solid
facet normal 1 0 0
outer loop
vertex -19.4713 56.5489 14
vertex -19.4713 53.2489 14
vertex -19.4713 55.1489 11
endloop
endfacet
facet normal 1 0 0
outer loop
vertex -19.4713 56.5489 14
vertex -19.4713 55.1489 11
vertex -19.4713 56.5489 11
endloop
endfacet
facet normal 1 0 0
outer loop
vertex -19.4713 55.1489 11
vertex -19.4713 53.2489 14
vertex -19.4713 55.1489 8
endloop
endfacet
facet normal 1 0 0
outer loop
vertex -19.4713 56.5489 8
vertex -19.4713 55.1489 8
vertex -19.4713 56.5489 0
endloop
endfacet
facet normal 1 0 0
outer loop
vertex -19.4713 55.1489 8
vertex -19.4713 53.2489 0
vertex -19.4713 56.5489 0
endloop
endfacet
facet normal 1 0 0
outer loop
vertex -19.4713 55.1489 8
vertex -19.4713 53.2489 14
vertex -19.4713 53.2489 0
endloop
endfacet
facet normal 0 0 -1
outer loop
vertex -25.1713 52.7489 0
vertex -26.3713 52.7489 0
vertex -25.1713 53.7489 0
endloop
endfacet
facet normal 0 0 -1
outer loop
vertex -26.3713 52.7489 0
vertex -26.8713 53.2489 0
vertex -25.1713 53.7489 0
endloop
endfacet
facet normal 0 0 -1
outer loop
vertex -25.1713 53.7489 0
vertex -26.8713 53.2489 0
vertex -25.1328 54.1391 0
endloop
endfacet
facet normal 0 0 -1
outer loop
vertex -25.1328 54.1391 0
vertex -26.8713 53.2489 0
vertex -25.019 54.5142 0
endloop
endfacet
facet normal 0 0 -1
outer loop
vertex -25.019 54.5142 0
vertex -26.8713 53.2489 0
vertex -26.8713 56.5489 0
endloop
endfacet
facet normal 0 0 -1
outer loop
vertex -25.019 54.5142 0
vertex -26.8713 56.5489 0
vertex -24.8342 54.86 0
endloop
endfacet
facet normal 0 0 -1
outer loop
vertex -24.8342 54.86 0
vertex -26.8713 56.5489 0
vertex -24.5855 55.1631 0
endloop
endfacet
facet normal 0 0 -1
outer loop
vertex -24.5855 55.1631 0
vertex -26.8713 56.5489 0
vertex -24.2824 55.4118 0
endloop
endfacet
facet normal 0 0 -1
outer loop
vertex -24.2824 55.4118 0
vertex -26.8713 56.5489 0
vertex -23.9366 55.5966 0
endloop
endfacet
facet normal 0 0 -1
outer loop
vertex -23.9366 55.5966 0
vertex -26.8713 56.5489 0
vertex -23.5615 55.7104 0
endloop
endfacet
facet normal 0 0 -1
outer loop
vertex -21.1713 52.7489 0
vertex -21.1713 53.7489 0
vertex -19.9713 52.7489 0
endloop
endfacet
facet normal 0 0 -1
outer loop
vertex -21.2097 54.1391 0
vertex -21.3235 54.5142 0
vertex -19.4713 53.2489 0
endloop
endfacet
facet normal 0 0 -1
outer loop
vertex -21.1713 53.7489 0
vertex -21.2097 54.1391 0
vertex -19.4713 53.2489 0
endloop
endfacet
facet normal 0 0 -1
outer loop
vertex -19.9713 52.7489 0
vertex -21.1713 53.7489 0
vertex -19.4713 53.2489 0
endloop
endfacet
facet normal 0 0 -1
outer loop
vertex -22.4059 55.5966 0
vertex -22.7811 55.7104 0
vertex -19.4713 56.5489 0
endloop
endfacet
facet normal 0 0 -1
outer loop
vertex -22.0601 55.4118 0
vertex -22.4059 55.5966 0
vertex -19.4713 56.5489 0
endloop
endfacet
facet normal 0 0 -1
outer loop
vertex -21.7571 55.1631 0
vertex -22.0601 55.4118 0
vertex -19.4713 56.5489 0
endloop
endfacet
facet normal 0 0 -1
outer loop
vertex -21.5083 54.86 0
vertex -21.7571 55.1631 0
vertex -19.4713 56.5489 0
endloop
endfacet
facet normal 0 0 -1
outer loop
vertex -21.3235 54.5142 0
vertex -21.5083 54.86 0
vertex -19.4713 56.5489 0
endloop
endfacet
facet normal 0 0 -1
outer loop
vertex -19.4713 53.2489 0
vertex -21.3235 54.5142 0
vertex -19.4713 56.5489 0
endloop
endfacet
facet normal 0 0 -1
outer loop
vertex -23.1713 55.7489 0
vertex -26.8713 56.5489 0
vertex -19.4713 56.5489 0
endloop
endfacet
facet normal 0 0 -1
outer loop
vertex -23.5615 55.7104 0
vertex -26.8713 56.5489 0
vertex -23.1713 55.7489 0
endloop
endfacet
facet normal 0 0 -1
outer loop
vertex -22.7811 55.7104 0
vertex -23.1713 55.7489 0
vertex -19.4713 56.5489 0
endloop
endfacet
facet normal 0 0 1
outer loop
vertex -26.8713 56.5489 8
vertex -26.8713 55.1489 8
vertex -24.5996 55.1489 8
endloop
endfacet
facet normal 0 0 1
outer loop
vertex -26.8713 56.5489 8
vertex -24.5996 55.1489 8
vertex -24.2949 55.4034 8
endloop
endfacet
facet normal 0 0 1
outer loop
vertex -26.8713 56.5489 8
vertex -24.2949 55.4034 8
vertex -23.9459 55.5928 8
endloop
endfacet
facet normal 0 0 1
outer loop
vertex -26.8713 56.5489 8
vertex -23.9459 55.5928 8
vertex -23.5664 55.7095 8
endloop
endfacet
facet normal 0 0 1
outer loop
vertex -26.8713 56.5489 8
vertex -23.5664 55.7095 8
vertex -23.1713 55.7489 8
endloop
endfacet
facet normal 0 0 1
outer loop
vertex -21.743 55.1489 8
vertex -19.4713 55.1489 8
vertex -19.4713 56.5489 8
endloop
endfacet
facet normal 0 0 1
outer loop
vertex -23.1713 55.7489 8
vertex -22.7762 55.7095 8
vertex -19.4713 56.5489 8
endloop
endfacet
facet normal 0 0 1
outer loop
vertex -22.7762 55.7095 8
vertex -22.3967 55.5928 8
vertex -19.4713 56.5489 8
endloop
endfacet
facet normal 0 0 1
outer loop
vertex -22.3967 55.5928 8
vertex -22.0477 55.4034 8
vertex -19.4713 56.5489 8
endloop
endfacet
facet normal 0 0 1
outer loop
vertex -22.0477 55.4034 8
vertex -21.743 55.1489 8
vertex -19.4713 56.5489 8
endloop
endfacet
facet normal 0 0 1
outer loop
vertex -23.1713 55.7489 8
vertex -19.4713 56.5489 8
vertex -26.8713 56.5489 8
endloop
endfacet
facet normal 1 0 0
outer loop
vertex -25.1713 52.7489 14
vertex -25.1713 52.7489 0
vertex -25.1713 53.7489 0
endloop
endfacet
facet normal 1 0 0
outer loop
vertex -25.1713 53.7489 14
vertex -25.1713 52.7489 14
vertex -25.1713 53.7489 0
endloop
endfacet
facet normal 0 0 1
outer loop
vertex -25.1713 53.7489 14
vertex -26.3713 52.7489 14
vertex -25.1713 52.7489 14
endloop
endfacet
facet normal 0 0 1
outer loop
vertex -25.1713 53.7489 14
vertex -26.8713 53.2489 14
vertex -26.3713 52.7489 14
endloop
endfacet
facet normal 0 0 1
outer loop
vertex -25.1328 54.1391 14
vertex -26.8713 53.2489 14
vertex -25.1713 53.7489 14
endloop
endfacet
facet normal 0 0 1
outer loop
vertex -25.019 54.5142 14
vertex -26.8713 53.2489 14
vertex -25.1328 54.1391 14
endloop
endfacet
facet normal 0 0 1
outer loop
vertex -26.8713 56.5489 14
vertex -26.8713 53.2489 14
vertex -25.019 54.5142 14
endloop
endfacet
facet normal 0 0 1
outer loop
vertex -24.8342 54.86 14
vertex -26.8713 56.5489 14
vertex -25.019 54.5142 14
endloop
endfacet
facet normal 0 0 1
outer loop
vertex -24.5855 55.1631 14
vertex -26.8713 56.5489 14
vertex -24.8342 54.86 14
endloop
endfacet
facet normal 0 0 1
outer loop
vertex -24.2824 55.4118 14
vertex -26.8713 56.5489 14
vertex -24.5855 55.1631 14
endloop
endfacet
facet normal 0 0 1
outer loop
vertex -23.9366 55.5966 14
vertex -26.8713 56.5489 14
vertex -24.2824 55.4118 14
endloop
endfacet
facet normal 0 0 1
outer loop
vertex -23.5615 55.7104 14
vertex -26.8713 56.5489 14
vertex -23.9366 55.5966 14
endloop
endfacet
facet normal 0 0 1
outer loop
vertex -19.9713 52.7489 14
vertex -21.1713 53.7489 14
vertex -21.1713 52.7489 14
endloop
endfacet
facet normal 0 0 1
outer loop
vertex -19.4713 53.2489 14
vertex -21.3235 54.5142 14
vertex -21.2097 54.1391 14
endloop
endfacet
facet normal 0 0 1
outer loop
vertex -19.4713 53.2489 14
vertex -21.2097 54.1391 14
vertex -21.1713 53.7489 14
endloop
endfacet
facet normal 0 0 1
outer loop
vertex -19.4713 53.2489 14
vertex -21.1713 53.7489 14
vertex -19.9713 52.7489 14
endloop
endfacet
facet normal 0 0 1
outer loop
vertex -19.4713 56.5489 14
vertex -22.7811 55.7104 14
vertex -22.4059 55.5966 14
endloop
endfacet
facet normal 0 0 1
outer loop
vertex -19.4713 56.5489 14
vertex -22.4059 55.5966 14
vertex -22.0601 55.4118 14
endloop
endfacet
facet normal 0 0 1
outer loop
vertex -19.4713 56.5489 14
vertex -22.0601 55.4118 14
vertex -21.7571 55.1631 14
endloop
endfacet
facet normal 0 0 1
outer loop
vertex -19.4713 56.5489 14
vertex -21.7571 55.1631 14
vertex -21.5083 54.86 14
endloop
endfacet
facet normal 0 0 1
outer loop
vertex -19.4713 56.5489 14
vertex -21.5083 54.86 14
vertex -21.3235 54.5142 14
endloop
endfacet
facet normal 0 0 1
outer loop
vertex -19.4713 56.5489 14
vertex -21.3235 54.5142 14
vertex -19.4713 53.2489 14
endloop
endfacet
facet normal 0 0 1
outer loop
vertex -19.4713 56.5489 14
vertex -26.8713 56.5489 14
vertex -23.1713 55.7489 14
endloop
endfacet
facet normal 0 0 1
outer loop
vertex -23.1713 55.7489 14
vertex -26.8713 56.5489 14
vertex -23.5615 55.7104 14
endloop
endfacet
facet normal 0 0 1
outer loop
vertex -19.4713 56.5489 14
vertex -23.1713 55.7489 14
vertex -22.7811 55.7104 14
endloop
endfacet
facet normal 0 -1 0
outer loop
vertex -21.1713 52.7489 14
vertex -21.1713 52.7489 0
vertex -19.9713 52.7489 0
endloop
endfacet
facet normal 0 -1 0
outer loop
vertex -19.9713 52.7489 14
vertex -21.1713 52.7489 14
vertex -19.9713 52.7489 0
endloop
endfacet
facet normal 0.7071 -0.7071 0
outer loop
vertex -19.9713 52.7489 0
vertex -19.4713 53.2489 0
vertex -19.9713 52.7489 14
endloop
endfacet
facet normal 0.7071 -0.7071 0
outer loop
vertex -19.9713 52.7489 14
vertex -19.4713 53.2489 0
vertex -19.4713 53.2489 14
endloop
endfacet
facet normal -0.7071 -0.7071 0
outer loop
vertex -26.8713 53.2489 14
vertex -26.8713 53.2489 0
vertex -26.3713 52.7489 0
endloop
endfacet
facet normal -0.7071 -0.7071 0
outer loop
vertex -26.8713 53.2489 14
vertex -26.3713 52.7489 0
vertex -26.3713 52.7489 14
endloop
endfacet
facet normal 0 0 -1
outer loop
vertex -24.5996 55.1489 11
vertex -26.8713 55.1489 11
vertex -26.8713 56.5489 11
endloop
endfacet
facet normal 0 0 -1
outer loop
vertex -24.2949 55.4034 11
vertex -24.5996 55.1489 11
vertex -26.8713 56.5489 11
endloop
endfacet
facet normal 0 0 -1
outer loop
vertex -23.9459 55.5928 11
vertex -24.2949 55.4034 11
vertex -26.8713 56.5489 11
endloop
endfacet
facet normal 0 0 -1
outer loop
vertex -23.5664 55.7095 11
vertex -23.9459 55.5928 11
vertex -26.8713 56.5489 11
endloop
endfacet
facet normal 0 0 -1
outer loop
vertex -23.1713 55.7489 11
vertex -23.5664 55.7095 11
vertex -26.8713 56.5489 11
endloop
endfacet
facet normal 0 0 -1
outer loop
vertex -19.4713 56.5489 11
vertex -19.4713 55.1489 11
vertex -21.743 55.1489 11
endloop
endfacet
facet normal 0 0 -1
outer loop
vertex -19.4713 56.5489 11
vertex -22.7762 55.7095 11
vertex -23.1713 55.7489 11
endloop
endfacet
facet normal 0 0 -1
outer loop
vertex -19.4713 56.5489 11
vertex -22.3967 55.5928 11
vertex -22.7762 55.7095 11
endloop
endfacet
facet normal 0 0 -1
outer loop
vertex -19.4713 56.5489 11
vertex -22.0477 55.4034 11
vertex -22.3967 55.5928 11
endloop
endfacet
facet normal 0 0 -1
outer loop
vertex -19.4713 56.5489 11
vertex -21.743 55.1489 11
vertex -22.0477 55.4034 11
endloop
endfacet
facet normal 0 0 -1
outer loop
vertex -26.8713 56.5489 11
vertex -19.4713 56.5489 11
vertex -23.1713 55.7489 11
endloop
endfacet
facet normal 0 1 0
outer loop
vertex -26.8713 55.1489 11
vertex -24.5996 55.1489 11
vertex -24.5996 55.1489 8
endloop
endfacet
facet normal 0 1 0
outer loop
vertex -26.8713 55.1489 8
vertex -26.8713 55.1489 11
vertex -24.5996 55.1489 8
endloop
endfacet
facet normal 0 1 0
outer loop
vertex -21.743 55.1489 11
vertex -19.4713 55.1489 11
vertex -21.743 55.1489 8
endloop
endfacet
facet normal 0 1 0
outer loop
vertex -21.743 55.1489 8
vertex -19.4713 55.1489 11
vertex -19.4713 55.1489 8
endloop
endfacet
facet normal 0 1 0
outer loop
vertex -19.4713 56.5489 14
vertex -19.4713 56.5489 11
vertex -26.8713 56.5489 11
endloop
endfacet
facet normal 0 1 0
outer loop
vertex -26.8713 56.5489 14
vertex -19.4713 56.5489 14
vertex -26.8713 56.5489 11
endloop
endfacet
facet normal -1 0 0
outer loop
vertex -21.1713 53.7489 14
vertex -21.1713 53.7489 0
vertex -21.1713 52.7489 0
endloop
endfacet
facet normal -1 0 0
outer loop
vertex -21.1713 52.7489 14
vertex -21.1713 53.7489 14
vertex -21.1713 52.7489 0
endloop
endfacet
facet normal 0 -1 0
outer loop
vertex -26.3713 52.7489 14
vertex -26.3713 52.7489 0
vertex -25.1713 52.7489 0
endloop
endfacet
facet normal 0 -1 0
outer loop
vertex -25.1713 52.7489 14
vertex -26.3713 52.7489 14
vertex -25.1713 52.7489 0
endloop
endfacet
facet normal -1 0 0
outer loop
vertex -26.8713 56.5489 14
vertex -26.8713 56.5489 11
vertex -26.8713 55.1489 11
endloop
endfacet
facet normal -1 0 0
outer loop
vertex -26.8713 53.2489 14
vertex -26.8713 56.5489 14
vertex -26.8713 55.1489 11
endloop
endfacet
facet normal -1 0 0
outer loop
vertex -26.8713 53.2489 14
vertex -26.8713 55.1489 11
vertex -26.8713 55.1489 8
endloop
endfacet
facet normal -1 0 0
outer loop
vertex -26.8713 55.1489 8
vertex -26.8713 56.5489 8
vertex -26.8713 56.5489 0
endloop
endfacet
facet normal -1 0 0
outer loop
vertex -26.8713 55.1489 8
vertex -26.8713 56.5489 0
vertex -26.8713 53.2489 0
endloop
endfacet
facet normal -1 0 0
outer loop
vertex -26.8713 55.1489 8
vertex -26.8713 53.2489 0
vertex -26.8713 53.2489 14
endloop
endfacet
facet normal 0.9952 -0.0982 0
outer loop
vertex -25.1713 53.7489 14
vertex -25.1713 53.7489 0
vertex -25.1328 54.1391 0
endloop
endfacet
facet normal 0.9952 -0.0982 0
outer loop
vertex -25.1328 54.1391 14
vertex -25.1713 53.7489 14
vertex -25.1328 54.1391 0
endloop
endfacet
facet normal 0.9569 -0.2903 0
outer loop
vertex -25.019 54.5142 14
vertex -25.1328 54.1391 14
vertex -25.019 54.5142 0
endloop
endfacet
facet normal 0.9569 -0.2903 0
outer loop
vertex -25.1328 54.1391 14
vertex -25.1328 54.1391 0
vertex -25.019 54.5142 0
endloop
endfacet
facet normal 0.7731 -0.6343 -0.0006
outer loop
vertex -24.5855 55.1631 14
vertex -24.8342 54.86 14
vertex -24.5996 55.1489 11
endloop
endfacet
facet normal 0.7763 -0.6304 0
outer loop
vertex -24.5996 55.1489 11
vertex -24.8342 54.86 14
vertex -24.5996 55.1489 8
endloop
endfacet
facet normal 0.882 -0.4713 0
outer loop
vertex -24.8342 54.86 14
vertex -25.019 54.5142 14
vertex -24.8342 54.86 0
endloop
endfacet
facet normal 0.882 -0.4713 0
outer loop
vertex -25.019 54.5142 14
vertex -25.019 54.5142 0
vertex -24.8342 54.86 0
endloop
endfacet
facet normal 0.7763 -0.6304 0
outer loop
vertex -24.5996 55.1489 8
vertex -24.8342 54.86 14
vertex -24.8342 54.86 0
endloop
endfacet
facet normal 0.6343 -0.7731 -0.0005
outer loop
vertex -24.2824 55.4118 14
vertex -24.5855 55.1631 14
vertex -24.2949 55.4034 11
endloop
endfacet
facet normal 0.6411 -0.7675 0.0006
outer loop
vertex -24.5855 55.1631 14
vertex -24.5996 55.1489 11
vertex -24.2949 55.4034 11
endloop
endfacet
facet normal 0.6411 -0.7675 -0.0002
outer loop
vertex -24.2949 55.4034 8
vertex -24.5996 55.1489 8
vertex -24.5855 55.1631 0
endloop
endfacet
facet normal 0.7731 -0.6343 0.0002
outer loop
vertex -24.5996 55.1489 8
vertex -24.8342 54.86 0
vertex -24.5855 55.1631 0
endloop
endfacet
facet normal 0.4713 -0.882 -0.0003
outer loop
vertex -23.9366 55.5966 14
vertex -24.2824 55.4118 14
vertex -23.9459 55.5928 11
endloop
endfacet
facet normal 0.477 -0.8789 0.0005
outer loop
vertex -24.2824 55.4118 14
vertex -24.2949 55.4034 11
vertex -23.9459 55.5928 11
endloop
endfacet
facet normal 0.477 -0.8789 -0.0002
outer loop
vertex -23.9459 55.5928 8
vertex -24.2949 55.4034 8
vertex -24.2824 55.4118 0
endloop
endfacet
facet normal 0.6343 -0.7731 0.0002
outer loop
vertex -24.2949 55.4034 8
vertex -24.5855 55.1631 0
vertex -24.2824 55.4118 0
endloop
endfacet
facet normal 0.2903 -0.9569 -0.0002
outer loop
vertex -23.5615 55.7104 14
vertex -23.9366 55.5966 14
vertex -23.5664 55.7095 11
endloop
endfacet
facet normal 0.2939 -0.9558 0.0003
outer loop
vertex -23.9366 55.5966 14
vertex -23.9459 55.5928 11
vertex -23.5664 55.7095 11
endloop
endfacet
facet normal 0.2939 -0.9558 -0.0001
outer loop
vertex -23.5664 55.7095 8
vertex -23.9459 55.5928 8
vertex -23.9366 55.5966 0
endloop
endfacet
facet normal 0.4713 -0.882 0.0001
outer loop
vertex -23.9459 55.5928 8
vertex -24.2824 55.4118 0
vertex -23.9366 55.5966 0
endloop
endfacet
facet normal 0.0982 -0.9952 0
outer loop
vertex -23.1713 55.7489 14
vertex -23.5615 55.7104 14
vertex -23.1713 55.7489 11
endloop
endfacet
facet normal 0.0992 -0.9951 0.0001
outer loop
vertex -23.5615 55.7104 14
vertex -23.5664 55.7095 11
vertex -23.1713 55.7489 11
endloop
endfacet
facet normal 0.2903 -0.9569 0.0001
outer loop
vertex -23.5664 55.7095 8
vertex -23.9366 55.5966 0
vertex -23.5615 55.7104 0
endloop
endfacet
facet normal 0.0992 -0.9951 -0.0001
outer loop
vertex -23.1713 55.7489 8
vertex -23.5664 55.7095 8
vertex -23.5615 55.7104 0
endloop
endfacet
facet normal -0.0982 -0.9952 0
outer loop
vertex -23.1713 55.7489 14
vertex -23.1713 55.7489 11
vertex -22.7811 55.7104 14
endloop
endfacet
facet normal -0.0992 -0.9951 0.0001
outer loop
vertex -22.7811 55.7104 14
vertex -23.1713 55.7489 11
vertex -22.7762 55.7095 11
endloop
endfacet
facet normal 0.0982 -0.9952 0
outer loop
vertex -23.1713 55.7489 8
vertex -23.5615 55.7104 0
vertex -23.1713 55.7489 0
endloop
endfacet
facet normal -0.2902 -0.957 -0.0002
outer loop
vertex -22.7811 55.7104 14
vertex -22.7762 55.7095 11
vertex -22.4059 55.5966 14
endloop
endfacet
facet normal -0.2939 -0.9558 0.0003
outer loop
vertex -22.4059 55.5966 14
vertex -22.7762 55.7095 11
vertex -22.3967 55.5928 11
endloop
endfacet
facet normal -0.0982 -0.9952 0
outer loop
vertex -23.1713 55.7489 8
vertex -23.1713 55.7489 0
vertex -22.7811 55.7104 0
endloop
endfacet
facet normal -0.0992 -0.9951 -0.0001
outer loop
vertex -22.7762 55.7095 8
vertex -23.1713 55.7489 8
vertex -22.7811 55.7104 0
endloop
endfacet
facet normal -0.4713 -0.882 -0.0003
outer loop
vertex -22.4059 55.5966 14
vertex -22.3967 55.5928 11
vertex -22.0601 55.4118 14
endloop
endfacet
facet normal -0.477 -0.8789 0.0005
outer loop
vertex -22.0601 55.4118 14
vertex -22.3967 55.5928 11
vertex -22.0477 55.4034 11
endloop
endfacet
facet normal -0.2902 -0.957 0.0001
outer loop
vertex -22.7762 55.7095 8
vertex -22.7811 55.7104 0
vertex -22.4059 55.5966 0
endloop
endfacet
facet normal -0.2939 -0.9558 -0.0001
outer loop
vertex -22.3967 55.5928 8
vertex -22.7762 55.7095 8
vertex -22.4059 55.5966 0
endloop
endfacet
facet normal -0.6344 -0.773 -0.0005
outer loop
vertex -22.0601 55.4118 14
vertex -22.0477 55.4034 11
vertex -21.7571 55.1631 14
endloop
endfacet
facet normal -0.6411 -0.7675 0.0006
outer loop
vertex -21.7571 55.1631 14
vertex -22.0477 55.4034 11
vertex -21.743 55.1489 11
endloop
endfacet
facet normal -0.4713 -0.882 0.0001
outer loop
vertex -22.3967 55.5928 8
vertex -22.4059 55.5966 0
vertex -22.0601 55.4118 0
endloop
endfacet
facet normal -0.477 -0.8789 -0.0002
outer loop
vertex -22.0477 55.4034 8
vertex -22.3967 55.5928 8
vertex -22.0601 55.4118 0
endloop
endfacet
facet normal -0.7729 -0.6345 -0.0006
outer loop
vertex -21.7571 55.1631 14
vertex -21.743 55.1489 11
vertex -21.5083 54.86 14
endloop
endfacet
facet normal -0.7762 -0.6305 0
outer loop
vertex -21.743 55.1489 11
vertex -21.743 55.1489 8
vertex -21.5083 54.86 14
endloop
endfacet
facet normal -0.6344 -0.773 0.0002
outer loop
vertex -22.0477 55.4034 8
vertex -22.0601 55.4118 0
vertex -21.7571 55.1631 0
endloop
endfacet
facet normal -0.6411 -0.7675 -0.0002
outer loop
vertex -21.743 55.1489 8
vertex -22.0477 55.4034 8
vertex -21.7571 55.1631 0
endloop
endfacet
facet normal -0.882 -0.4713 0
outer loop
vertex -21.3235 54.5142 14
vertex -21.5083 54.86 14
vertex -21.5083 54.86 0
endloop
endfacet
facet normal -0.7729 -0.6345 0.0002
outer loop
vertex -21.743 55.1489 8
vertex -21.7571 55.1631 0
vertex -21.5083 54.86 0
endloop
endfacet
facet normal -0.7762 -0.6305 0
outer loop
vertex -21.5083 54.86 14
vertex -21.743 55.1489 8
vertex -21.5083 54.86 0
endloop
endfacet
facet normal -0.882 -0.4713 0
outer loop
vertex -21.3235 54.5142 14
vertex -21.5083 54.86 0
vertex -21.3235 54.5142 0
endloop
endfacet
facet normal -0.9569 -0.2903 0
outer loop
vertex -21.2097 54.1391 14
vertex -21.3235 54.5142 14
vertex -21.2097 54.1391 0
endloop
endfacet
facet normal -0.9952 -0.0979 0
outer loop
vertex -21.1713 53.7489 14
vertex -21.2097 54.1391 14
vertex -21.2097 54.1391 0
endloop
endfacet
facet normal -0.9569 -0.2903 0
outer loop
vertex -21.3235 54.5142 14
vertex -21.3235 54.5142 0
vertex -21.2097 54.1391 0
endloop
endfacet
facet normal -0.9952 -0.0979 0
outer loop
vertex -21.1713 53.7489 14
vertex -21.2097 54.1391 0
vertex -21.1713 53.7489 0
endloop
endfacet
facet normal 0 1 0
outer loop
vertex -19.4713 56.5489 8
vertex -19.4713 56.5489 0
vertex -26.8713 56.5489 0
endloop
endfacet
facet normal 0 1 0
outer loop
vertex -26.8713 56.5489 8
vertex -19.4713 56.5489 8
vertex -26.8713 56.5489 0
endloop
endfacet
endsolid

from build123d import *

# Parameters (mm, degrees)
BOSS_EXTRUDE1_DEPTH = 14
CHAMFER1_SIZE       = 0.5
SKETCH2_W           = 3
SKETCH2_H           = 1.4
CUT_EXTRUDE1_DEPTH  = 15


with BuildPart() as part:
    # Sketch1 → Boss-Extrude1 (new body)
    with BuildSketch(Plane.XY):
        with BuildLine():
            Line((-26.871279399, 53.748878842), (-26.871279399, 52.748878842))
            Line((-26.871279399, 52.748878842), (-25.171279399, 52.748878842))
            Line((-25.171279399, 52.748878842), (-25.171279399, 53.748878842))
            ThreePointArc((-25.171279399, 53.748878842), (-23.171279399, 55.748878842), (-21.171279399, 53.748878842))
            Line((-21.171279399, 53.748878842), (-21.171279399, 52.748878842))
            Line((-21.171279399, 52.748878842), (-19.471279399, 52.748878842))
            Line((-19.471279399, 52.748878842), (-19.471279399, 53.748878842))
            Line((-19.471279399, 53.748878842), (-19.471279399, 56.548878842))
            Line((-19.471279399, 56.548878842), (-26.871279399, 56.548878842))
            Line((-26.871279399, 56.548878842), (-26.871279399, 53.748878842))
        make_face()
    extrude(amount=BOSS_EXTRUDE1_DEPTH)

    # Chamfer1
    chamfer1_edges = [part.edges().sort_by_distance(p)[0] for p in [
        (-26.871279399, 52.748878842, 7),
        (-19.471279399, 52.748878842, 7),
    ]]
    chamfer(chamfer1_edges, length=CHAMFER1_SIZE)

    # Sketch2 → Cut-Extrude1 (cut)
    with BuildSketch(Plane(origin=(-19.471279399, 0, 0), x_dir=(0, 0, -1), z_dir=(1, 0, 0))):
        with Locations((-9.5, 55.848878842)):
            Rectangle(SKETCH2_W, SKETCH2_H)
    extrude(amount=-CUT_EXTRUDE1_DEPTH, mode=Mode.SUBTRACT)


solid = part.part
